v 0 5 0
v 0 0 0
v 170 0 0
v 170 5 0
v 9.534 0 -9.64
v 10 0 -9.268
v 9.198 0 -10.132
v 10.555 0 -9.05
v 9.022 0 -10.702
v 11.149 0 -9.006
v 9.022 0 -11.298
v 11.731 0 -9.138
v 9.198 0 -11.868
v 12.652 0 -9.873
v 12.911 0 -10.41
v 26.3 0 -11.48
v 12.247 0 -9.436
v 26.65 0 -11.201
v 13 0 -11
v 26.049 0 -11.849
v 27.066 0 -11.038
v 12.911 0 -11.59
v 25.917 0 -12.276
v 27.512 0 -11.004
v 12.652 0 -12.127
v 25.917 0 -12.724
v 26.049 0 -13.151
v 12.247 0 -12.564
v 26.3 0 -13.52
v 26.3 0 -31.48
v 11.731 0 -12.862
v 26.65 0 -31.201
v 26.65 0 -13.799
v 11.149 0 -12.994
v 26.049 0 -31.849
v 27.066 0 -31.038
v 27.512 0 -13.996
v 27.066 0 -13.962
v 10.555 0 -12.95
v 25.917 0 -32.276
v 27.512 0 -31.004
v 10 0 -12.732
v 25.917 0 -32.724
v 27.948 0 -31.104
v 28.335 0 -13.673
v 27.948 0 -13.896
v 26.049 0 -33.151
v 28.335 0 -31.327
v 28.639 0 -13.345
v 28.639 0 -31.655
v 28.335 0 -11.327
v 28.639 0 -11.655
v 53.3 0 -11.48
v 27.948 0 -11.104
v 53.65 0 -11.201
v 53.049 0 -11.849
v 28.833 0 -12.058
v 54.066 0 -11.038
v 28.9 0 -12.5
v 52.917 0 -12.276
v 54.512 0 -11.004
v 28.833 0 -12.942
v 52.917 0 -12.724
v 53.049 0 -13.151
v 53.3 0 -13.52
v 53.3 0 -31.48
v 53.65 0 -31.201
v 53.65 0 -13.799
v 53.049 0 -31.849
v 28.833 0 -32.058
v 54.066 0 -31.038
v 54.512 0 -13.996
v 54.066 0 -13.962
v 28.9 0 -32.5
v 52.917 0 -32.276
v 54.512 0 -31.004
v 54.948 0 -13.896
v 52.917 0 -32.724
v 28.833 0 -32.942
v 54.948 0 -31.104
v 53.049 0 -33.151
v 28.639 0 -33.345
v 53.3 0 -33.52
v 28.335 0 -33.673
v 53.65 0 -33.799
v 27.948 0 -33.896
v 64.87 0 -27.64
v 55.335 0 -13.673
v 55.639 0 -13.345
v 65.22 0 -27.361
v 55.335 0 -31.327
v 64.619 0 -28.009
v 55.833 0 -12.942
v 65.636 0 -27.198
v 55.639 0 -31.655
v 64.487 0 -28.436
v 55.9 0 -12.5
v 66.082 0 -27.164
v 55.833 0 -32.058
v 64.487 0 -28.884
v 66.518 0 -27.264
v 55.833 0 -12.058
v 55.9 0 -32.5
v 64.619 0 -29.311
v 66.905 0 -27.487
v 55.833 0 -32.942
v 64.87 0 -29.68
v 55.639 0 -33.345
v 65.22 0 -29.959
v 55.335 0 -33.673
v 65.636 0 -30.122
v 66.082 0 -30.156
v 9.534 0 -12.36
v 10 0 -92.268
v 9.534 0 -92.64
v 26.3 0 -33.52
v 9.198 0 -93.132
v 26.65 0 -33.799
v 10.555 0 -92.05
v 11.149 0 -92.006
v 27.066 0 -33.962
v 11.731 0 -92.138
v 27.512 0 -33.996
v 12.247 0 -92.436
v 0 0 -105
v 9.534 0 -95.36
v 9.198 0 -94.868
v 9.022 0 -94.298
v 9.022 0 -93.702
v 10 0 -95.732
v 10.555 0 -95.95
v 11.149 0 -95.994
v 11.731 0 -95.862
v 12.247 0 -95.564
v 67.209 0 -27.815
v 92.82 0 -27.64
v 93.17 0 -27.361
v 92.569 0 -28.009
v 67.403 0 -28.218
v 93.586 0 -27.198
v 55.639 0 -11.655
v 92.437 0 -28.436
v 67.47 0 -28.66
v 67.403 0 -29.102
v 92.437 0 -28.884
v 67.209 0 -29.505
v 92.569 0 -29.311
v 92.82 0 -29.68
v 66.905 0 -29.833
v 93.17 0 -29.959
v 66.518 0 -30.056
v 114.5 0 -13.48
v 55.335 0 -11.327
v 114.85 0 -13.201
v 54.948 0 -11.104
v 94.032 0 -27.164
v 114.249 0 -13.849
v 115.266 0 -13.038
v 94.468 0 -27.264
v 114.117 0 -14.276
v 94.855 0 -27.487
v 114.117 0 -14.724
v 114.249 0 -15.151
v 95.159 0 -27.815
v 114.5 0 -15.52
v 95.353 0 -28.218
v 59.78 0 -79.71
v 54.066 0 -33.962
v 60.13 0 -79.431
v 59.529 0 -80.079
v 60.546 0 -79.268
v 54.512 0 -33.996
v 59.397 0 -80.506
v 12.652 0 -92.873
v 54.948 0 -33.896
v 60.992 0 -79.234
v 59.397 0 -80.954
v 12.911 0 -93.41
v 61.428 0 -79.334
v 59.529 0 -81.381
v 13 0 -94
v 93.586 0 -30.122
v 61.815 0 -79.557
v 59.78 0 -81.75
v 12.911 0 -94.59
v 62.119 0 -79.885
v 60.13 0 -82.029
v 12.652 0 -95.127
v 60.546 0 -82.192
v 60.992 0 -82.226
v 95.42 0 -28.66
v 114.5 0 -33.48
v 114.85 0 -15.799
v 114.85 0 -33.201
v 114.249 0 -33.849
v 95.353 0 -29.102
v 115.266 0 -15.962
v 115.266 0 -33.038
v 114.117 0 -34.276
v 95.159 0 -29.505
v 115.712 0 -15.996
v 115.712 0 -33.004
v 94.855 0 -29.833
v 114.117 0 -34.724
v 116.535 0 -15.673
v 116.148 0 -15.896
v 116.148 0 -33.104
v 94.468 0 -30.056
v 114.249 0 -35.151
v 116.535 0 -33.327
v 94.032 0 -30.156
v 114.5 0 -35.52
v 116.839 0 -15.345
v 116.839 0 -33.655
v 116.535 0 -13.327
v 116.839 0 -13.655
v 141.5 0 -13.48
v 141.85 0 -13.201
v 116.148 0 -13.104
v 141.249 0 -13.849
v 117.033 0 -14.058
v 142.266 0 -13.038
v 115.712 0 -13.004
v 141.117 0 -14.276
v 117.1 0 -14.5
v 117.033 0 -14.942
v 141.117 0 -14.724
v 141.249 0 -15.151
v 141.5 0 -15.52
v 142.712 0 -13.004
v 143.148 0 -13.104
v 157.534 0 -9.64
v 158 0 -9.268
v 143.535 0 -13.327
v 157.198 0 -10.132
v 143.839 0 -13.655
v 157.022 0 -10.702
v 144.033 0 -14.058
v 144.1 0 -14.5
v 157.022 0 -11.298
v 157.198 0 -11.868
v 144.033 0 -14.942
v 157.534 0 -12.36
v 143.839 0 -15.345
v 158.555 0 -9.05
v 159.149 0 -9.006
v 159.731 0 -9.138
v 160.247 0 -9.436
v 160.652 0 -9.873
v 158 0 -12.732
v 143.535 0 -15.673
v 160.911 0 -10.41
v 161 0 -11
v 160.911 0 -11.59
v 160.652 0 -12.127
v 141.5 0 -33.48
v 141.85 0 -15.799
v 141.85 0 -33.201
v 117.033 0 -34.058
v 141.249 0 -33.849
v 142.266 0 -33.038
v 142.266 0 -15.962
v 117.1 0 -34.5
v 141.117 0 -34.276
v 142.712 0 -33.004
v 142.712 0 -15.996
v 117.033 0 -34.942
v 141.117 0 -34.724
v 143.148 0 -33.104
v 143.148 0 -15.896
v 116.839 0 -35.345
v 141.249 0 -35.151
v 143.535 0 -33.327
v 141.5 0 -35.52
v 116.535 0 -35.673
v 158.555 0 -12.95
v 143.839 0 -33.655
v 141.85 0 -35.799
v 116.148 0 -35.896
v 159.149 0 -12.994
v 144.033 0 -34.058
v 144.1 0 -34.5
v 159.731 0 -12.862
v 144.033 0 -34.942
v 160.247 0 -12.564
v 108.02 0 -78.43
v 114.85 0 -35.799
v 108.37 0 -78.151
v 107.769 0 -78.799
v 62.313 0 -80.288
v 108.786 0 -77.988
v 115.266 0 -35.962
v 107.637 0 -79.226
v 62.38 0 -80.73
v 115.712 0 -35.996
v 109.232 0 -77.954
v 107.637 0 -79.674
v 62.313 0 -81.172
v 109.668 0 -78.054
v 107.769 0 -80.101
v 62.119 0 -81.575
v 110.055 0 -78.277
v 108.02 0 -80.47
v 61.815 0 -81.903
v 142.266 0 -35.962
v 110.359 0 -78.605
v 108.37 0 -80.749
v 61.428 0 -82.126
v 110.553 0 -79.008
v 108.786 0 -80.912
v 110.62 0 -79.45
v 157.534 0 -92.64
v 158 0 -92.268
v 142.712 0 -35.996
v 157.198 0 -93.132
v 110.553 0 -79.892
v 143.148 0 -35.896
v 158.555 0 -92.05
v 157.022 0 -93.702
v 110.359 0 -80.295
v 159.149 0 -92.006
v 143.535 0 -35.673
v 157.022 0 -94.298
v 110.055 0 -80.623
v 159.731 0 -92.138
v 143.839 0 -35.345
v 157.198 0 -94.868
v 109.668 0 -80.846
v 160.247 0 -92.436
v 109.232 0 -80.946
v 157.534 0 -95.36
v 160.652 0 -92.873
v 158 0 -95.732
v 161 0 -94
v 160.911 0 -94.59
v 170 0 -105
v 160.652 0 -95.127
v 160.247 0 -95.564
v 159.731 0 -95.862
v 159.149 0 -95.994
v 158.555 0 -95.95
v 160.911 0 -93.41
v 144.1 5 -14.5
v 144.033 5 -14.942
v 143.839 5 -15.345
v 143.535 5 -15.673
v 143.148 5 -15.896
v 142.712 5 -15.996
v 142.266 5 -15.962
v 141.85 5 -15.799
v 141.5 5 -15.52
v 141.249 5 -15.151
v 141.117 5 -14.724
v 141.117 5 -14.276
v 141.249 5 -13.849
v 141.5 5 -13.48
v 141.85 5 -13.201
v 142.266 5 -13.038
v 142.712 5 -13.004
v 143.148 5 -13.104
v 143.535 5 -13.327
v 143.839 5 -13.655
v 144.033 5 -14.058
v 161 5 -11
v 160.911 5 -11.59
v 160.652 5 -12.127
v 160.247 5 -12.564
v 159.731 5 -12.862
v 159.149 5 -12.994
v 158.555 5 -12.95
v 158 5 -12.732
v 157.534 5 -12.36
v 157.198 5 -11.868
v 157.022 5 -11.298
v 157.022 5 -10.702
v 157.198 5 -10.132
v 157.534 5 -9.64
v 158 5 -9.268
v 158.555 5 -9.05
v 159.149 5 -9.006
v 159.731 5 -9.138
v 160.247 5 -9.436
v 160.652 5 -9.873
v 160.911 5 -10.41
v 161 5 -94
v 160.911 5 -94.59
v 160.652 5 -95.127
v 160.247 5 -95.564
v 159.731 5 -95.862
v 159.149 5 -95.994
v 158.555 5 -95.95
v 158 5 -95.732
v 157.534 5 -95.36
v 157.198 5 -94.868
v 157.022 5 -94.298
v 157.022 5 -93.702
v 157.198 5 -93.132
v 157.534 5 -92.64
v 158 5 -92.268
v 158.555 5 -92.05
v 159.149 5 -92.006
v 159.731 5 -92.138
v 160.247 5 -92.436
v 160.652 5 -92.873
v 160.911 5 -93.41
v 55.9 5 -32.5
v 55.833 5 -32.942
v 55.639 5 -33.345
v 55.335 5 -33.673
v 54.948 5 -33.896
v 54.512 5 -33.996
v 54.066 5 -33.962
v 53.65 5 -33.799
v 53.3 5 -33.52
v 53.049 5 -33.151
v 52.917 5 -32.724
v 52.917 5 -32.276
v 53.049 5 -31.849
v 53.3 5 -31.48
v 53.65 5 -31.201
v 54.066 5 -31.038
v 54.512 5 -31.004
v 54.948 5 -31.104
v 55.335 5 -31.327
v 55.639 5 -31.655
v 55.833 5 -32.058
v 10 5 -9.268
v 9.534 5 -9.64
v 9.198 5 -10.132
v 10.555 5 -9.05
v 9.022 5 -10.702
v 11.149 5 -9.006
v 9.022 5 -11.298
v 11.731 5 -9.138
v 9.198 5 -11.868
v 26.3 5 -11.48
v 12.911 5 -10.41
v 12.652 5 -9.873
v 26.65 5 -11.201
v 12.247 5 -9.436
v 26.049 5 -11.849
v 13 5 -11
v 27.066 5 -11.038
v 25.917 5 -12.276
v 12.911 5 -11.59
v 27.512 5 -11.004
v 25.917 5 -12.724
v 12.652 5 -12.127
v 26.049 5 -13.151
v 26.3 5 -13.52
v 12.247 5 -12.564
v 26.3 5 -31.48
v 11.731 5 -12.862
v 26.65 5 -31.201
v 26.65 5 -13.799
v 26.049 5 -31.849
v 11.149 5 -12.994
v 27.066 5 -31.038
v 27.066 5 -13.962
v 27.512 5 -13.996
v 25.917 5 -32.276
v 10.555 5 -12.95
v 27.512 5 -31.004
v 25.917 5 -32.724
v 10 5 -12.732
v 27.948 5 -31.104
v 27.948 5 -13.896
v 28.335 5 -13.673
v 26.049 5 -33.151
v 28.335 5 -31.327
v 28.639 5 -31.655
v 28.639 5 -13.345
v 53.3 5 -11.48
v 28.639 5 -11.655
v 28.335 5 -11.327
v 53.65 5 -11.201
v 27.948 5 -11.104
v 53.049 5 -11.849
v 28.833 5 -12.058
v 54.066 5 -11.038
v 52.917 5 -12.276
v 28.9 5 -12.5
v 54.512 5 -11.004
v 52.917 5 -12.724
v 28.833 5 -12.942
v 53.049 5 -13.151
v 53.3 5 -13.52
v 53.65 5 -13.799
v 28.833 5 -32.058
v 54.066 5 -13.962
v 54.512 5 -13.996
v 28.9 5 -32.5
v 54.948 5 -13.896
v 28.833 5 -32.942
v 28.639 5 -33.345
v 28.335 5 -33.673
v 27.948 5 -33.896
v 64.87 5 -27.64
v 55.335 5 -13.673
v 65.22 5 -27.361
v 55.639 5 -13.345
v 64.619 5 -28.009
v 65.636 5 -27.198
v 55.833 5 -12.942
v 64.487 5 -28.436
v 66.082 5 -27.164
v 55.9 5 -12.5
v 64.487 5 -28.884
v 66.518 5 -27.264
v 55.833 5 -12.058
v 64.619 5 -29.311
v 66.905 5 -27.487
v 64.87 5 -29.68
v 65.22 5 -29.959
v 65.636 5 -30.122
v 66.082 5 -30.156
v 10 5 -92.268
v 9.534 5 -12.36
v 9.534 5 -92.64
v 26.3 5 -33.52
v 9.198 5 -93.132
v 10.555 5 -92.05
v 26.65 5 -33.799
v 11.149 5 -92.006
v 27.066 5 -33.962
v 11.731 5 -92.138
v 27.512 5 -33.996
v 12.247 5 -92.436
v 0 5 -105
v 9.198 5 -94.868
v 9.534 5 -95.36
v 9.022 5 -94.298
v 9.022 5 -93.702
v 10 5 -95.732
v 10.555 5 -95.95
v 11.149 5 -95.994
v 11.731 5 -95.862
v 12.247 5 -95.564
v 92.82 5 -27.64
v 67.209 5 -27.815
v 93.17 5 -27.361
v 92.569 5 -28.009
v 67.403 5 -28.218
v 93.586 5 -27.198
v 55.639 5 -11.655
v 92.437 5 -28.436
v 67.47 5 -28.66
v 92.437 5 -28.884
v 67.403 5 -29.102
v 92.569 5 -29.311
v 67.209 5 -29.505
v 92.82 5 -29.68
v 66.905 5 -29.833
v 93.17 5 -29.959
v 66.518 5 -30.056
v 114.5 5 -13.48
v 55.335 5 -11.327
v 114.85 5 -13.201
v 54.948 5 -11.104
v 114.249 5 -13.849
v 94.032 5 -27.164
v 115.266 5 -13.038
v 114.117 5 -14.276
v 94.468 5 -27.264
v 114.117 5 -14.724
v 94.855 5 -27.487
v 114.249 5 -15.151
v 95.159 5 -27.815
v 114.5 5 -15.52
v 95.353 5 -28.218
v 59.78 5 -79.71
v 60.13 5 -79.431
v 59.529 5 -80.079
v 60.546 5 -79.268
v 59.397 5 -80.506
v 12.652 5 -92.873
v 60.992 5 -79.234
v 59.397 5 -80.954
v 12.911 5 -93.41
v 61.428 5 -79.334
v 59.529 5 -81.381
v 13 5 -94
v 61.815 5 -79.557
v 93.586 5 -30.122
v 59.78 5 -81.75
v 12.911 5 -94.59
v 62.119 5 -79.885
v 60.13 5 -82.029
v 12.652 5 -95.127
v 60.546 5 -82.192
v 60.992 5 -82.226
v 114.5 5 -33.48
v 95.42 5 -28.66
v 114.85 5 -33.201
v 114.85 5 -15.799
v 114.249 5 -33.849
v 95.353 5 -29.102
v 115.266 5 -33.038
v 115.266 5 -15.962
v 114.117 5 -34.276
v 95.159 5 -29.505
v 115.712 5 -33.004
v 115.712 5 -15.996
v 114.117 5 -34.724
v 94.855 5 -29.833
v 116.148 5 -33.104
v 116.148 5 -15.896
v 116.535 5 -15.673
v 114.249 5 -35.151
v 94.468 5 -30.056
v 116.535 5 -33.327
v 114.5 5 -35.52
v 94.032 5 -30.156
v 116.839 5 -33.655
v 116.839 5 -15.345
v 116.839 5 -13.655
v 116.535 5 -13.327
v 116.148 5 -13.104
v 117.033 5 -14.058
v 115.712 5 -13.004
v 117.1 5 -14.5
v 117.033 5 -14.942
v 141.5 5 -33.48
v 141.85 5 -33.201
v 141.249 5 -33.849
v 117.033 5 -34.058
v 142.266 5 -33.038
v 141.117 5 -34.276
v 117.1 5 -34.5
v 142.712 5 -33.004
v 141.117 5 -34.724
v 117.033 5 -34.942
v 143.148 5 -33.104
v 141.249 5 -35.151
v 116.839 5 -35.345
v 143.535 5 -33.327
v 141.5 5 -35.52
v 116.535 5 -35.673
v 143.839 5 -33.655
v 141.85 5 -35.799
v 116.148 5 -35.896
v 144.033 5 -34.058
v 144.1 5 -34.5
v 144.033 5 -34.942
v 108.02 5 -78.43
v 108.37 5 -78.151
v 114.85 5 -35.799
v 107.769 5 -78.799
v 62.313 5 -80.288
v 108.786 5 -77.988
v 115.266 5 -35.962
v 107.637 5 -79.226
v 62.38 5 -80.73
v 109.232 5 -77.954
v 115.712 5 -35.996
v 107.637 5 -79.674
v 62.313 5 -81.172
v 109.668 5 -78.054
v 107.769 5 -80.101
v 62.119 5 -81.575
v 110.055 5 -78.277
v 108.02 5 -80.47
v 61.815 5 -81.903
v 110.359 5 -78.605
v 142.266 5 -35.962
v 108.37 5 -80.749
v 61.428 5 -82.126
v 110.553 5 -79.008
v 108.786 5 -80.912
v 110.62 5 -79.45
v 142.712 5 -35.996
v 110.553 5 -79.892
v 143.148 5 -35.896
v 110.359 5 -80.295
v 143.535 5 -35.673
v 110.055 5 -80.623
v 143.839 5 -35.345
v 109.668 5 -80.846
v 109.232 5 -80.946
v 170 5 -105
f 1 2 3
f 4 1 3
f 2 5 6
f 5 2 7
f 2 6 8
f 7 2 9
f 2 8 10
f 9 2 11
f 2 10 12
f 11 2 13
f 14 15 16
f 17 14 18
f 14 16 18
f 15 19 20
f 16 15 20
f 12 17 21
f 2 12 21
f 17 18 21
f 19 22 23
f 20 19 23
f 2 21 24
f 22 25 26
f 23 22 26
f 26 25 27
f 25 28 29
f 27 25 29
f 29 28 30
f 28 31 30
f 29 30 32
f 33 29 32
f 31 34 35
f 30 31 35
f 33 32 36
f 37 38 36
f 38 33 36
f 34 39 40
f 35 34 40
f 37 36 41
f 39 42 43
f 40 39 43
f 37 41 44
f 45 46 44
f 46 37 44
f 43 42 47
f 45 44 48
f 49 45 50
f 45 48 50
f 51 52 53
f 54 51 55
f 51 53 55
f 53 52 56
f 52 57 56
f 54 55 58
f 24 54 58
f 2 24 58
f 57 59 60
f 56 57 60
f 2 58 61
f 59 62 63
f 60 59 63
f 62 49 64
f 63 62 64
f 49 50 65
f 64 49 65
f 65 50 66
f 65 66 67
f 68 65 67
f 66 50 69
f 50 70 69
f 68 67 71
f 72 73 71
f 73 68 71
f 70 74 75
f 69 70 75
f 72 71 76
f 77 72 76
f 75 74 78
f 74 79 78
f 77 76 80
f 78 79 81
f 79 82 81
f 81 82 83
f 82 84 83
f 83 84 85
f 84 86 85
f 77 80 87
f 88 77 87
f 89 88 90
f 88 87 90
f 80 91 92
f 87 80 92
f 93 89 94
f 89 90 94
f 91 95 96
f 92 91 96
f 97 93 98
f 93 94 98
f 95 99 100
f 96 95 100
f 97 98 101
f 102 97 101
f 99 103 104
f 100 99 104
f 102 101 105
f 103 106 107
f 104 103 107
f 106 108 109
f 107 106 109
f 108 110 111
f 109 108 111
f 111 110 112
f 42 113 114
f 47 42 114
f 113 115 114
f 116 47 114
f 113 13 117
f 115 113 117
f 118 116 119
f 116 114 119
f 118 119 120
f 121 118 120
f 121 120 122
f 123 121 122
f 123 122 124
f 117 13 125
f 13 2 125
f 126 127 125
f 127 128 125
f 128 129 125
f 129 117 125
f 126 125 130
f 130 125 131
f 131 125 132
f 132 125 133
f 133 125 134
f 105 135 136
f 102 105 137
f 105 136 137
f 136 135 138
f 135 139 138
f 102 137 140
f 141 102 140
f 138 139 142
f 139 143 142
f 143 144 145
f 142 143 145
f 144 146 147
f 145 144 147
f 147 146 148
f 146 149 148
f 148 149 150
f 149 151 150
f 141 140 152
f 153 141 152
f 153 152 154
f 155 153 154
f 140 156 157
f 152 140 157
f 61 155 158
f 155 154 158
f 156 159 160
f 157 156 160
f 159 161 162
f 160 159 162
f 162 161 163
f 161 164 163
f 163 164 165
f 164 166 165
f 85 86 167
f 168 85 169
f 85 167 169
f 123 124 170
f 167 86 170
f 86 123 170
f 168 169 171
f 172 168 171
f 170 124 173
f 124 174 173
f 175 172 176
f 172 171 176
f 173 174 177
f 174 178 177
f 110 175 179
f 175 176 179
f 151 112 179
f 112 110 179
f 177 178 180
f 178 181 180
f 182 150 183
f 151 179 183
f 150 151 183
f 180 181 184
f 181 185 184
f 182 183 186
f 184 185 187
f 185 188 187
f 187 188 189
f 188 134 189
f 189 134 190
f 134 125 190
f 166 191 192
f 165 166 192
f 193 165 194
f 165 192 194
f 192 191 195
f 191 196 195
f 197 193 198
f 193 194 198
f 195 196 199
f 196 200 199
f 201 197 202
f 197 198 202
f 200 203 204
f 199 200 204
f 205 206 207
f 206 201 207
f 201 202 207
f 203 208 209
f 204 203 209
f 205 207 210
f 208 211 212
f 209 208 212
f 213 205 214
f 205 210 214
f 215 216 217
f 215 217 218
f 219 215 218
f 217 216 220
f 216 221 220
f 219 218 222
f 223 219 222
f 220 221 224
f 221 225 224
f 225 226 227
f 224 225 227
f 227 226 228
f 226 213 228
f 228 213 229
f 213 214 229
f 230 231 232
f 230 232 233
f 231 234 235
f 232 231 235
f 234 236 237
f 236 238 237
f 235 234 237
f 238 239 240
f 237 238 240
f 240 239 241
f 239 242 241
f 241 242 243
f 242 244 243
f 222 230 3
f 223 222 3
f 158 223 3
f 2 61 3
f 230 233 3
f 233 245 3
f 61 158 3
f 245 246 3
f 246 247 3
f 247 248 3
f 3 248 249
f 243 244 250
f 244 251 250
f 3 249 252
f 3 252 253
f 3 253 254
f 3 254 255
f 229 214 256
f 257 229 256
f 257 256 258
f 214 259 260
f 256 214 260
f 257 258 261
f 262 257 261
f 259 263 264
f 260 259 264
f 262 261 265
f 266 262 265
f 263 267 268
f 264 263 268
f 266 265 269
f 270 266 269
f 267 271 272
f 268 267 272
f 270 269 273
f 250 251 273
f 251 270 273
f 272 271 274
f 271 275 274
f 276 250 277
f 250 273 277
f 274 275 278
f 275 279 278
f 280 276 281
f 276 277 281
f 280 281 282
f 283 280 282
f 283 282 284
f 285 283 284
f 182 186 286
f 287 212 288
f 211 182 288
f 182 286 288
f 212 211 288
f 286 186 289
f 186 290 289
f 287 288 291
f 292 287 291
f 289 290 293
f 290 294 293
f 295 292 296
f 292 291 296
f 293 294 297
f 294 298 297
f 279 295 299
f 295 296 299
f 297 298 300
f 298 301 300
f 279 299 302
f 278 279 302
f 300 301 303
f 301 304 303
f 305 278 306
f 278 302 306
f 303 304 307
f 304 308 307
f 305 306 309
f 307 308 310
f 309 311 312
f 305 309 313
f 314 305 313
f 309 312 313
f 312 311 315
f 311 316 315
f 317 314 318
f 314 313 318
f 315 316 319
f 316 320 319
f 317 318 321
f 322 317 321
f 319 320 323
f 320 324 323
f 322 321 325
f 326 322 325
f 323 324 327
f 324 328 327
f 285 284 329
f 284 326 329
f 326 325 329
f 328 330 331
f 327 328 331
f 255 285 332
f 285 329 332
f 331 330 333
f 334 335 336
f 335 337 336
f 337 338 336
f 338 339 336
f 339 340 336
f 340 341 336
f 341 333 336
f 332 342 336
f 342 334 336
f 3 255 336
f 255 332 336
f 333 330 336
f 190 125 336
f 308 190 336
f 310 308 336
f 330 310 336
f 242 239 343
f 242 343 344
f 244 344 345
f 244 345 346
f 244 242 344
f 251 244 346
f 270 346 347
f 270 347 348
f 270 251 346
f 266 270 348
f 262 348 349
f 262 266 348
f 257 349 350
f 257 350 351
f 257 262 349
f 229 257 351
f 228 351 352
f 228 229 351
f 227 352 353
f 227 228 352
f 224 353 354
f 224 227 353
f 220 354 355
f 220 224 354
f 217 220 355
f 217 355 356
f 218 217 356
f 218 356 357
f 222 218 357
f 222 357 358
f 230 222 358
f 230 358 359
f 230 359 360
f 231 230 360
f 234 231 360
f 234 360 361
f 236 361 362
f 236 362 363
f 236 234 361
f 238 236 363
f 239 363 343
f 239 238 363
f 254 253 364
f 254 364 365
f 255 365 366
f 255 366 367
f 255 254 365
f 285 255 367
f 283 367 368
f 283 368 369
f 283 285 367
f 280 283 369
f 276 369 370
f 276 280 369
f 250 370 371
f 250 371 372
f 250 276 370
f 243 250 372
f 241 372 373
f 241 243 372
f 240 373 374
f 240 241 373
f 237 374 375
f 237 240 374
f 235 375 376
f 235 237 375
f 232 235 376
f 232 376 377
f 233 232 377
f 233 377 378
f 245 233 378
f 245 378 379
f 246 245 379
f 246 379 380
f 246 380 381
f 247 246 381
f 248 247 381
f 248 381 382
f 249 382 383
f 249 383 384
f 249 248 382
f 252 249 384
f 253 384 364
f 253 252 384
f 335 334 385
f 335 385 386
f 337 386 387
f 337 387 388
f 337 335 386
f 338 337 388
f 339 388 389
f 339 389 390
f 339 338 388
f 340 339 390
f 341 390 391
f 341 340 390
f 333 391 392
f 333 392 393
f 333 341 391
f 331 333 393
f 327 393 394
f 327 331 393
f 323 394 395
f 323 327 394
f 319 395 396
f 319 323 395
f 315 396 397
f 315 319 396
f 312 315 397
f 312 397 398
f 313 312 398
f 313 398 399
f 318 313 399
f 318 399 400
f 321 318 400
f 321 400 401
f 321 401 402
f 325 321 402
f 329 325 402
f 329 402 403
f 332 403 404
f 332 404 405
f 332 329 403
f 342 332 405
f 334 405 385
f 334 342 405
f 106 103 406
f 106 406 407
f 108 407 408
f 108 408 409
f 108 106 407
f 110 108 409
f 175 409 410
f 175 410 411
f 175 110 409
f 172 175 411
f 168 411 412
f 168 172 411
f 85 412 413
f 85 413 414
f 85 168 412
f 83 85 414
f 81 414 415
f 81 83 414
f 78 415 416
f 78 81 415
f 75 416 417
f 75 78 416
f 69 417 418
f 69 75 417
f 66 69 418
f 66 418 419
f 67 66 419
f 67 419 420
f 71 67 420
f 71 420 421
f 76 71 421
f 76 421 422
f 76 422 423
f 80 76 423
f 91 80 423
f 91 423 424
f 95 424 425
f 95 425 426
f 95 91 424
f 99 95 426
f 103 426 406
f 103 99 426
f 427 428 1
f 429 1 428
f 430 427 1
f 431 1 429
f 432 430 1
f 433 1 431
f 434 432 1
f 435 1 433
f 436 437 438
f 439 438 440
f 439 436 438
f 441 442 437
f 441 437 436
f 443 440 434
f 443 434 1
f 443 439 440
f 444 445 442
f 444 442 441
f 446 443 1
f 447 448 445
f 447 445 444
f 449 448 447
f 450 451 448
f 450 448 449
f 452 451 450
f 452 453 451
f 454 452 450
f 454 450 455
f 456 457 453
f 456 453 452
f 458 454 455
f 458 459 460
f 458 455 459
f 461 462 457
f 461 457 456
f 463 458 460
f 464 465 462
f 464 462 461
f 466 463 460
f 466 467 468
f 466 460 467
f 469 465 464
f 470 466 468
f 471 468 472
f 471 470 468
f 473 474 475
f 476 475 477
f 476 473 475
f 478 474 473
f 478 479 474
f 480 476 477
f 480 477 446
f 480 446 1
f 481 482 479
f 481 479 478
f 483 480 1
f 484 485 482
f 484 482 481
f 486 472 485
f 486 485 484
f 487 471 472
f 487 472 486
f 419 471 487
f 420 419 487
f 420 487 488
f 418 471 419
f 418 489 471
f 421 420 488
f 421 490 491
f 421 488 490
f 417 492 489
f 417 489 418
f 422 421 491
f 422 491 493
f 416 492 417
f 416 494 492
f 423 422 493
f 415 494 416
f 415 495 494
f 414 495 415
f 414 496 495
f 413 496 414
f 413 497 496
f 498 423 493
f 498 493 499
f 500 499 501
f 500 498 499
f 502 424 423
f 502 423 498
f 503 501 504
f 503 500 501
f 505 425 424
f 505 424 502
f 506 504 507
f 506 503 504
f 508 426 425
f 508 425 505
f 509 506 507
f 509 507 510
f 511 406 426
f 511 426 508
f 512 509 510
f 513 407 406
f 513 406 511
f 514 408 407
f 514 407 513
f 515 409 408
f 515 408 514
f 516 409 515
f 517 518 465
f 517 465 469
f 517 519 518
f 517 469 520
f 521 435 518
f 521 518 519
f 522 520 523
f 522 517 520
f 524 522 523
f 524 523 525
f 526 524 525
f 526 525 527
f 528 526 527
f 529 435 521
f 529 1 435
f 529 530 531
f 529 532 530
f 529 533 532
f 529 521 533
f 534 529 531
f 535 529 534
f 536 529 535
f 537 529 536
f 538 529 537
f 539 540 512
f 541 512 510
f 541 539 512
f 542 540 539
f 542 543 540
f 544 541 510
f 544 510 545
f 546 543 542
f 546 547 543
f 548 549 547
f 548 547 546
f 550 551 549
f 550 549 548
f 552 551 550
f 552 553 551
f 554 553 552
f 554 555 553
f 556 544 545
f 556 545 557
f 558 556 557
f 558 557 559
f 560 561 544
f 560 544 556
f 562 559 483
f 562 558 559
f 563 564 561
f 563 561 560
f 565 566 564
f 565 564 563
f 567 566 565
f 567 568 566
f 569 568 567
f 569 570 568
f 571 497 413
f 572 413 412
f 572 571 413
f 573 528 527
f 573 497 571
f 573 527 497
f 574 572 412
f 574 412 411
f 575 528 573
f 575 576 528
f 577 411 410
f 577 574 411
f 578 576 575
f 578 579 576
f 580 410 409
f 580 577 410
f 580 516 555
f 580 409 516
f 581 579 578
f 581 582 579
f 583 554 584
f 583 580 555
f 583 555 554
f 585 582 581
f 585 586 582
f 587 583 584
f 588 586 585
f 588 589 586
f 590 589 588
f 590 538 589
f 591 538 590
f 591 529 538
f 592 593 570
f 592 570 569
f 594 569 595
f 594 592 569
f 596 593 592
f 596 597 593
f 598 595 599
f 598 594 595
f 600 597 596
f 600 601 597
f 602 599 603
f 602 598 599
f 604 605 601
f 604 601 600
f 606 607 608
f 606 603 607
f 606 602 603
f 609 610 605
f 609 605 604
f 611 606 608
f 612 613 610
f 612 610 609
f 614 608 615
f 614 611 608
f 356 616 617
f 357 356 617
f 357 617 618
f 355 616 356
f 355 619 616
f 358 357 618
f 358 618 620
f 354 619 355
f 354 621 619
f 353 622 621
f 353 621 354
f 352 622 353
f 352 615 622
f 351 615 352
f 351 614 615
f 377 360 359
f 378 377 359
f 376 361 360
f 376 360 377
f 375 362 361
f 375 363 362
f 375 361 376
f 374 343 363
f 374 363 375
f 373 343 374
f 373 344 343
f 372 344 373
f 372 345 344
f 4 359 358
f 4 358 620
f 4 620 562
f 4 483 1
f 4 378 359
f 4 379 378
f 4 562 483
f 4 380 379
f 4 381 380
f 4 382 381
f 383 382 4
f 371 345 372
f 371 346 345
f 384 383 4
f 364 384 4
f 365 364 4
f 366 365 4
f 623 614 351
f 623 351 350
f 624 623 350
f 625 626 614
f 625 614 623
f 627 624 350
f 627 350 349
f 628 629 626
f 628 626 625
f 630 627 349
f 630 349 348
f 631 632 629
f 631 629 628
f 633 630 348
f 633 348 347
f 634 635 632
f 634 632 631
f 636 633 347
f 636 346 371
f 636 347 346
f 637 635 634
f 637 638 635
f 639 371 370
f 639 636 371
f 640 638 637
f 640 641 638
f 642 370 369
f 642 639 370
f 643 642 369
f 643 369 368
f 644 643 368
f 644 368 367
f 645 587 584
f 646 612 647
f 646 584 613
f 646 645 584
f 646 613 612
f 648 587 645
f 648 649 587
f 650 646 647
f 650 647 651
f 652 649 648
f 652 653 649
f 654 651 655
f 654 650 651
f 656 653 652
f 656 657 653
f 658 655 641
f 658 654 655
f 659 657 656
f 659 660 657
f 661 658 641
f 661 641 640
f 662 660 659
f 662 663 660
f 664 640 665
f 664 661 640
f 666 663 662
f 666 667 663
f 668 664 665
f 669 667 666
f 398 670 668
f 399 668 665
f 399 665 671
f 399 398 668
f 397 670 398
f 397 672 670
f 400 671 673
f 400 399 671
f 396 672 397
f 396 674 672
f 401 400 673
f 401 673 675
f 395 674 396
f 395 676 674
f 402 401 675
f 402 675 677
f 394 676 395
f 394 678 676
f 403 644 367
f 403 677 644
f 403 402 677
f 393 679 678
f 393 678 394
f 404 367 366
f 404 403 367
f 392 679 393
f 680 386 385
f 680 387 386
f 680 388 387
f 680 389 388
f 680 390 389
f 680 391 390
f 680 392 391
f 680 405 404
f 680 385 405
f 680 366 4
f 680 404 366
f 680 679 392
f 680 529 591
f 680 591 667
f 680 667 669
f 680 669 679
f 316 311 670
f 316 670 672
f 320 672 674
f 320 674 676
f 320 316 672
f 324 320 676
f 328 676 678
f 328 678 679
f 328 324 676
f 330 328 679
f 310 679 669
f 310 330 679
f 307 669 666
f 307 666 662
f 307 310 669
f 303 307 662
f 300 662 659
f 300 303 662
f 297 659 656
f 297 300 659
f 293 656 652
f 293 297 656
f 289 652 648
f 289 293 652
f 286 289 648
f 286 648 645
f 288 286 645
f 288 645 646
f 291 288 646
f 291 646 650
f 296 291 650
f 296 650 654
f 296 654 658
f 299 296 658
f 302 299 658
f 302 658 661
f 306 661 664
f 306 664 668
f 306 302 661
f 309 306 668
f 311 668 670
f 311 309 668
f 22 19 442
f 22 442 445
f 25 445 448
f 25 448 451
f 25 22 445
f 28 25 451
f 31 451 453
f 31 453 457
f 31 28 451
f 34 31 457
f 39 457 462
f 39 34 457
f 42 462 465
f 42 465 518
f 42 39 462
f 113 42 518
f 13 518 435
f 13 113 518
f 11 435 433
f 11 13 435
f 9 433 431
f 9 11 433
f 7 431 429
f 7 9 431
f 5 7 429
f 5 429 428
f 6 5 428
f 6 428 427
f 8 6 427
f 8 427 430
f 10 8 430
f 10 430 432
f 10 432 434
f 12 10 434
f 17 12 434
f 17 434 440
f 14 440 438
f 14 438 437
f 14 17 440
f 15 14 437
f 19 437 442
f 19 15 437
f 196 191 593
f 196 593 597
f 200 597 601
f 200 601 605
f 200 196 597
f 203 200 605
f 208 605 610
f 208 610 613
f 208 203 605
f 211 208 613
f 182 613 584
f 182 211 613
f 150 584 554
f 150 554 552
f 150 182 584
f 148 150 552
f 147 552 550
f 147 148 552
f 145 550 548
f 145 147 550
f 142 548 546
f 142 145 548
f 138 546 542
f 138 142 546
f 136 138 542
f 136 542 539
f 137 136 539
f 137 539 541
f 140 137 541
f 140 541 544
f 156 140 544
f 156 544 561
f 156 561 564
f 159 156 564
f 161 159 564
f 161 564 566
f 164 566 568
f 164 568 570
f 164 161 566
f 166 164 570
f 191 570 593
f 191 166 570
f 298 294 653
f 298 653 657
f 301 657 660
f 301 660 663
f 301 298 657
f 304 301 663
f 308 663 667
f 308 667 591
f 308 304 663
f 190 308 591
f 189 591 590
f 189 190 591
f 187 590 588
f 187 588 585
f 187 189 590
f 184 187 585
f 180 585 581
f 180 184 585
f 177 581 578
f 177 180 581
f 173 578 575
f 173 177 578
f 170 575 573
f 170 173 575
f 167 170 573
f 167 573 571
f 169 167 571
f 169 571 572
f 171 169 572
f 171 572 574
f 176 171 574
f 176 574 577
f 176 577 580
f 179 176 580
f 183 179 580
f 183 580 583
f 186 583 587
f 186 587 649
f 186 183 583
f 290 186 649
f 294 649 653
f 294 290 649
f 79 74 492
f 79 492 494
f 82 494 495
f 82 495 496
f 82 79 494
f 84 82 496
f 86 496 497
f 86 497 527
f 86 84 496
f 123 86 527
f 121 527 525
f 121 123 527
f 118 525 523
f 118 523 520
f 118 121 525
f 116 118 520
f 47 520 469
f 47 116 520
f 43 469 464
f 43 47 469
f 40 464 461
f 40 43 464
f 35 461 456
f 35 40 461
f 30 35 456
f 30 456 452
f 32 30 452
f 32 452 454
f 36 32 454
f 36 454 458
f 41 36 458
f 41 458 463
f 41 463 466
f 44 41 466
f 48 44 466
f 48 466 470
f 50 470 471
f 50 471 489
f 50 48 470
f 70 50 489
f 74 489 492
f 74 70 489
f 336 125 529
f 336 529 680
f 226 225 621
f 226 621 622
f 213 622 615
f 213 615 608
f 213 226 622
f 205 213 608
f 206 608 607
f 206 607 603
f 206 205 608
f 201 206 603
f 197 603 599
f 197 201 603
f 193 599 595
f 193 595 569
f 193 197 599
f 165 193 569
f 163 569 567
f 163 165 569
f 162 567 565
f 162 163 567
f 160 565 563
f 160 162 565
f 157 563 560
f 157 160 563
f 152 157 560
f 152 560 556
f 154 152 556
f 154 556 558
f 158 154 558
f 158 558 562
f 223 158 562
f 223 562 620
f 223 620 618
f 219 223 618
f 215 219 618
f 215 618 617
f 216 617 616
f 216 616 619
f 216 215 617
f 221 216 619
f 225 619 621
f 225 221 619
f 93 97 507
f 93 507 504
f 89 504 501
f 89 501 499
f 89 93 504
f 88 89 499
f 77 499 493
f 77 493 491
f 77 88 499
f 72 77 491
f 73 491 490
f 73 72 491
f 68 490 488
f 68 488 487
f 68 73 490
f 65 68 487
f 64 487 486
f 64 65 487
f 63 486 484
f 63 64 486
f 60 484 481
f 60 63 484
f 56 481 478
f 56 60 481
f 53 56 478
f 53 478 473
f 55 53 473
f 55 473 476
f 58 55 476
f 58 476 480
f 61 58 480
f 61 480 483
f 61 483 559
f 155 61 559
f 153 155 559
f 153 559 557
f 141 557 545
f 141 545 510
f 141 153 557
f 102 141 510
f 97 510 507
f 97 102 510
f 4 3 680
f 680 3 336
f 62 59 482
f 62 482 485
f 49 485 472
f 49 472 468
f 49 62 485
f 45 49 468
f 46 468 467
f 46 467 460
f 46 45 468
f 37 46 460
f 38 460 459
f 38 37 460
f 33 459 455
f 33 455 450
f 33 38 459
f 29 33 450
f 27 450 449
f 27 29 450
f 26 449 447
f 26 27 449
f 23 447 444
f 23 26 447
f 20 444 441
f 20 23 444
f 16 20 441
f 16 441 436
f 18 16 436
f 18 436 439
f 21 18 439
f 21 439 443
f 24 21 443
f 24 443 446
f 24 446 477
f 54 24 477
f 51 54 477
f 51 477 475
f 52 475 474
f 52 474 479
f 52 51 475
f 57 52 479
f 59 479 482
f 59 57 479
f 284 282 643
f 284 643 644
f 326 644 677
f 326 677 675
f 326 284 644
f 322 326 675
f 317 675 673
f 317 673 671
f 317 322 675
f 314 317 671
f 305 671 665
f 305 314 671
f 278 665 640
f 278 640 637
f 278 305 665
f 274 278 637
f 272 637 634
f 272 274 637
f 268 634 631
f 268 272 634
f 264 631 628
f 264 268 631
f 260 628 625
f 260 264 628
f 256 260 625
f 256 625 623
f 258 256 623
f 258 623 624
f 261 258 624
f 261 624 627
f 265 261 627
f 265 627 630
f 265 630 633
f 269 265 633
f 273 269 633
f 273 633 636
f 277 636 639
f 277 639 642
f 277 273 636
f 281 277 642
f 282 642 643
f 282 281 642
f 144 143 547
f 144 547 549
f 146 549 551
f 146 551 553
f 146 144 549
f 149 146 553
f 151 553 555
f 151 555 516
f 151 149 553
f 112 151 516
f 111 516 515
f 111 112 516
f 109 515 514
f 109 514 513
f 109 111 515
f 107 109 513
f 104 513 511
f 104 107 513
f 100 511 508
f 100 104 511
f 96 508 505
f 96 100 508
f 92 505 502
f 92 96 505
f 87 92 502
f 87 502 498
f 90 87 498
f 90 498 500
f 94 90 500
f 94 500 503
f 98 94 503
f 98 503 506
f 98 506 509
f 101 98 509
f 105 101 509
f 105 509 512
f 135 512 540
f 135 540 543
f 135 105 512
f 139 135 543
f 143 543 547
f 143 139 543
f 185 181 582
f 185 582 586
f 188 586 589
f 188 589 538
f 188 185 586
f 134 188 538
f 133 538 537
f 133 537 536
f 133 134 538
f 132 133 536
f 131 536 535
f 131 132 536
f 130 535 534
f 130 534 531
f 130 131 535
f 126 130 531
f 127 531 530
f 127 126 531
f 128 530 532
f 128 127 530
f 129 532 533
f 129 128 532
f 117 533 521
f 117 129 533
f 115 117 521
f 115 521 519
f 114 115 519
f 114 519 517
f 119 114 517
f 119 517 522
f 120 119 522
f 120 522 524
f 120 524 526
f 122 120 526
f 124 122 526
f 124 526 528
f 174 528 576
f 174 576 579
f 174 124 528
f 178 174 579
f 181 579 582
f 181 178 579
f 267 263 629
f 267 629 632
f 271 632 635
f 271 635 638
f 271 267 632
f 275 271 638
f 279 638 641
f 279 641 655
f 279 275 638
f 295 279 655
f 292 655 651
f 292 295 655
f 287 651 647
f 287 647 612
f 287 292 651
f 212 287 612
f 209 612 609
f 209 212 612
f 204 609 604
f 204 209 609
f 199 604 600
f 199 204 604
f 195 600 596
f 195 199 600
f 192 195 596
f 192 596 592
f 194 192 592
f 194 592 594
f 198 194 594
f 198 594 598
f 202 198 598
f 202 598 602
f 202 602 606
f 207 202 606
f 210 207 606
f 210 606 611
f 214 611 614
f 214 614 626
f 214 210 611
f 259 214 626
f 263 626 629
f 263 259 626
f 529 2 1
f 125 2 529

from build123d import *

# Parameters (mm, degrees)
SKETCH_1_W      = 170
SKETCH_1_H      = 105
SKETCH_1_R      = 2
SKETCH_1_R_2    = 1.5
EXTRUDE_1_DEPTH = 5


with BuildPart() as part:
    # ｽｹｯﾁ1 → ﾎﾞｽ - 押し出し1 (new body)
    with BuildSketch(Plane(origin=(0, 0, 0), x_dir=(1, 0, 0), z_dir=(0, 1, 0))):
        with Locations((85, 52.5)):
            Rectangle(SKETCH_1_W, SKETCH_1_H)
        with Locations((11, 94)):
            Circle(SKETCH_1_R, mode=Mode.SUBTRACT)
        with Locations((11, 11)):
            Circle(SKETCH_1_R, mode=Mode.SUBTRACT)
        with Locations((159, 11)):
            Circle(SKETCH_1_R, mode=Mode.SUBTRACT)
        with Locations((159, 94)):
            Circle(SKETCH_1_R, mode=Mode.SUBTRACT)
        with Locations((54.4, 12.5)):
            Circle(SKETCH_1_R_2, mode=Mode.SUBTRACT)
        with Locations((27.4, 12.5)):
            Circle(SKETCH_1_R_2, mode=Mode.SUBTRACT)
        with Locations((54.4, 32.5)):
            Circle(SKETCH_1_R_2, mode=Mode.SUBTRACT)
        with Locations((27.4, 32.5)):
            Circle(SKETCH_1_R_2, mode=Mode.SUBTRACT)
        with Locations((60.88, 80.73)):
            Circle(SKETCH_1_R_2, mode=Mode.SUBTRACT)
        with Locations((65.97, 28.66)):
            Circle(SKETCH_1_R_2, mode=Mode.SUBTRACT)
        with Locations((93.92, 28.66)):
            Circle(SKETCH_1_R_2, mode=Mode.SUBTRACT)
        with Locations((109.12, 79.45)):
            Circle(SKETCH_1_R_2, mode=Mode.SUBTRACT)
        with Locations((115.6, 34.5)):
            Circle(SKETCH_1_R_2, mode=Mode.SUBTRACT)
        with Locations((142.6, 34.5)):
            Circle(SKETCH_1_R_2, mode=Mode.SUBTRACT)
        with Locations((142.6, 14.5)):
            Circle(SKETCH_1_R_2, mode=Mode.SUBTRACT)
        with Locations((115.6, 14.5)):
            Circle(SKETCH_1_R_2, mode=Mode.SUBTRACT)
    extrude(amount=EXTRUDE_1_DEPTH)


solid = part.part
